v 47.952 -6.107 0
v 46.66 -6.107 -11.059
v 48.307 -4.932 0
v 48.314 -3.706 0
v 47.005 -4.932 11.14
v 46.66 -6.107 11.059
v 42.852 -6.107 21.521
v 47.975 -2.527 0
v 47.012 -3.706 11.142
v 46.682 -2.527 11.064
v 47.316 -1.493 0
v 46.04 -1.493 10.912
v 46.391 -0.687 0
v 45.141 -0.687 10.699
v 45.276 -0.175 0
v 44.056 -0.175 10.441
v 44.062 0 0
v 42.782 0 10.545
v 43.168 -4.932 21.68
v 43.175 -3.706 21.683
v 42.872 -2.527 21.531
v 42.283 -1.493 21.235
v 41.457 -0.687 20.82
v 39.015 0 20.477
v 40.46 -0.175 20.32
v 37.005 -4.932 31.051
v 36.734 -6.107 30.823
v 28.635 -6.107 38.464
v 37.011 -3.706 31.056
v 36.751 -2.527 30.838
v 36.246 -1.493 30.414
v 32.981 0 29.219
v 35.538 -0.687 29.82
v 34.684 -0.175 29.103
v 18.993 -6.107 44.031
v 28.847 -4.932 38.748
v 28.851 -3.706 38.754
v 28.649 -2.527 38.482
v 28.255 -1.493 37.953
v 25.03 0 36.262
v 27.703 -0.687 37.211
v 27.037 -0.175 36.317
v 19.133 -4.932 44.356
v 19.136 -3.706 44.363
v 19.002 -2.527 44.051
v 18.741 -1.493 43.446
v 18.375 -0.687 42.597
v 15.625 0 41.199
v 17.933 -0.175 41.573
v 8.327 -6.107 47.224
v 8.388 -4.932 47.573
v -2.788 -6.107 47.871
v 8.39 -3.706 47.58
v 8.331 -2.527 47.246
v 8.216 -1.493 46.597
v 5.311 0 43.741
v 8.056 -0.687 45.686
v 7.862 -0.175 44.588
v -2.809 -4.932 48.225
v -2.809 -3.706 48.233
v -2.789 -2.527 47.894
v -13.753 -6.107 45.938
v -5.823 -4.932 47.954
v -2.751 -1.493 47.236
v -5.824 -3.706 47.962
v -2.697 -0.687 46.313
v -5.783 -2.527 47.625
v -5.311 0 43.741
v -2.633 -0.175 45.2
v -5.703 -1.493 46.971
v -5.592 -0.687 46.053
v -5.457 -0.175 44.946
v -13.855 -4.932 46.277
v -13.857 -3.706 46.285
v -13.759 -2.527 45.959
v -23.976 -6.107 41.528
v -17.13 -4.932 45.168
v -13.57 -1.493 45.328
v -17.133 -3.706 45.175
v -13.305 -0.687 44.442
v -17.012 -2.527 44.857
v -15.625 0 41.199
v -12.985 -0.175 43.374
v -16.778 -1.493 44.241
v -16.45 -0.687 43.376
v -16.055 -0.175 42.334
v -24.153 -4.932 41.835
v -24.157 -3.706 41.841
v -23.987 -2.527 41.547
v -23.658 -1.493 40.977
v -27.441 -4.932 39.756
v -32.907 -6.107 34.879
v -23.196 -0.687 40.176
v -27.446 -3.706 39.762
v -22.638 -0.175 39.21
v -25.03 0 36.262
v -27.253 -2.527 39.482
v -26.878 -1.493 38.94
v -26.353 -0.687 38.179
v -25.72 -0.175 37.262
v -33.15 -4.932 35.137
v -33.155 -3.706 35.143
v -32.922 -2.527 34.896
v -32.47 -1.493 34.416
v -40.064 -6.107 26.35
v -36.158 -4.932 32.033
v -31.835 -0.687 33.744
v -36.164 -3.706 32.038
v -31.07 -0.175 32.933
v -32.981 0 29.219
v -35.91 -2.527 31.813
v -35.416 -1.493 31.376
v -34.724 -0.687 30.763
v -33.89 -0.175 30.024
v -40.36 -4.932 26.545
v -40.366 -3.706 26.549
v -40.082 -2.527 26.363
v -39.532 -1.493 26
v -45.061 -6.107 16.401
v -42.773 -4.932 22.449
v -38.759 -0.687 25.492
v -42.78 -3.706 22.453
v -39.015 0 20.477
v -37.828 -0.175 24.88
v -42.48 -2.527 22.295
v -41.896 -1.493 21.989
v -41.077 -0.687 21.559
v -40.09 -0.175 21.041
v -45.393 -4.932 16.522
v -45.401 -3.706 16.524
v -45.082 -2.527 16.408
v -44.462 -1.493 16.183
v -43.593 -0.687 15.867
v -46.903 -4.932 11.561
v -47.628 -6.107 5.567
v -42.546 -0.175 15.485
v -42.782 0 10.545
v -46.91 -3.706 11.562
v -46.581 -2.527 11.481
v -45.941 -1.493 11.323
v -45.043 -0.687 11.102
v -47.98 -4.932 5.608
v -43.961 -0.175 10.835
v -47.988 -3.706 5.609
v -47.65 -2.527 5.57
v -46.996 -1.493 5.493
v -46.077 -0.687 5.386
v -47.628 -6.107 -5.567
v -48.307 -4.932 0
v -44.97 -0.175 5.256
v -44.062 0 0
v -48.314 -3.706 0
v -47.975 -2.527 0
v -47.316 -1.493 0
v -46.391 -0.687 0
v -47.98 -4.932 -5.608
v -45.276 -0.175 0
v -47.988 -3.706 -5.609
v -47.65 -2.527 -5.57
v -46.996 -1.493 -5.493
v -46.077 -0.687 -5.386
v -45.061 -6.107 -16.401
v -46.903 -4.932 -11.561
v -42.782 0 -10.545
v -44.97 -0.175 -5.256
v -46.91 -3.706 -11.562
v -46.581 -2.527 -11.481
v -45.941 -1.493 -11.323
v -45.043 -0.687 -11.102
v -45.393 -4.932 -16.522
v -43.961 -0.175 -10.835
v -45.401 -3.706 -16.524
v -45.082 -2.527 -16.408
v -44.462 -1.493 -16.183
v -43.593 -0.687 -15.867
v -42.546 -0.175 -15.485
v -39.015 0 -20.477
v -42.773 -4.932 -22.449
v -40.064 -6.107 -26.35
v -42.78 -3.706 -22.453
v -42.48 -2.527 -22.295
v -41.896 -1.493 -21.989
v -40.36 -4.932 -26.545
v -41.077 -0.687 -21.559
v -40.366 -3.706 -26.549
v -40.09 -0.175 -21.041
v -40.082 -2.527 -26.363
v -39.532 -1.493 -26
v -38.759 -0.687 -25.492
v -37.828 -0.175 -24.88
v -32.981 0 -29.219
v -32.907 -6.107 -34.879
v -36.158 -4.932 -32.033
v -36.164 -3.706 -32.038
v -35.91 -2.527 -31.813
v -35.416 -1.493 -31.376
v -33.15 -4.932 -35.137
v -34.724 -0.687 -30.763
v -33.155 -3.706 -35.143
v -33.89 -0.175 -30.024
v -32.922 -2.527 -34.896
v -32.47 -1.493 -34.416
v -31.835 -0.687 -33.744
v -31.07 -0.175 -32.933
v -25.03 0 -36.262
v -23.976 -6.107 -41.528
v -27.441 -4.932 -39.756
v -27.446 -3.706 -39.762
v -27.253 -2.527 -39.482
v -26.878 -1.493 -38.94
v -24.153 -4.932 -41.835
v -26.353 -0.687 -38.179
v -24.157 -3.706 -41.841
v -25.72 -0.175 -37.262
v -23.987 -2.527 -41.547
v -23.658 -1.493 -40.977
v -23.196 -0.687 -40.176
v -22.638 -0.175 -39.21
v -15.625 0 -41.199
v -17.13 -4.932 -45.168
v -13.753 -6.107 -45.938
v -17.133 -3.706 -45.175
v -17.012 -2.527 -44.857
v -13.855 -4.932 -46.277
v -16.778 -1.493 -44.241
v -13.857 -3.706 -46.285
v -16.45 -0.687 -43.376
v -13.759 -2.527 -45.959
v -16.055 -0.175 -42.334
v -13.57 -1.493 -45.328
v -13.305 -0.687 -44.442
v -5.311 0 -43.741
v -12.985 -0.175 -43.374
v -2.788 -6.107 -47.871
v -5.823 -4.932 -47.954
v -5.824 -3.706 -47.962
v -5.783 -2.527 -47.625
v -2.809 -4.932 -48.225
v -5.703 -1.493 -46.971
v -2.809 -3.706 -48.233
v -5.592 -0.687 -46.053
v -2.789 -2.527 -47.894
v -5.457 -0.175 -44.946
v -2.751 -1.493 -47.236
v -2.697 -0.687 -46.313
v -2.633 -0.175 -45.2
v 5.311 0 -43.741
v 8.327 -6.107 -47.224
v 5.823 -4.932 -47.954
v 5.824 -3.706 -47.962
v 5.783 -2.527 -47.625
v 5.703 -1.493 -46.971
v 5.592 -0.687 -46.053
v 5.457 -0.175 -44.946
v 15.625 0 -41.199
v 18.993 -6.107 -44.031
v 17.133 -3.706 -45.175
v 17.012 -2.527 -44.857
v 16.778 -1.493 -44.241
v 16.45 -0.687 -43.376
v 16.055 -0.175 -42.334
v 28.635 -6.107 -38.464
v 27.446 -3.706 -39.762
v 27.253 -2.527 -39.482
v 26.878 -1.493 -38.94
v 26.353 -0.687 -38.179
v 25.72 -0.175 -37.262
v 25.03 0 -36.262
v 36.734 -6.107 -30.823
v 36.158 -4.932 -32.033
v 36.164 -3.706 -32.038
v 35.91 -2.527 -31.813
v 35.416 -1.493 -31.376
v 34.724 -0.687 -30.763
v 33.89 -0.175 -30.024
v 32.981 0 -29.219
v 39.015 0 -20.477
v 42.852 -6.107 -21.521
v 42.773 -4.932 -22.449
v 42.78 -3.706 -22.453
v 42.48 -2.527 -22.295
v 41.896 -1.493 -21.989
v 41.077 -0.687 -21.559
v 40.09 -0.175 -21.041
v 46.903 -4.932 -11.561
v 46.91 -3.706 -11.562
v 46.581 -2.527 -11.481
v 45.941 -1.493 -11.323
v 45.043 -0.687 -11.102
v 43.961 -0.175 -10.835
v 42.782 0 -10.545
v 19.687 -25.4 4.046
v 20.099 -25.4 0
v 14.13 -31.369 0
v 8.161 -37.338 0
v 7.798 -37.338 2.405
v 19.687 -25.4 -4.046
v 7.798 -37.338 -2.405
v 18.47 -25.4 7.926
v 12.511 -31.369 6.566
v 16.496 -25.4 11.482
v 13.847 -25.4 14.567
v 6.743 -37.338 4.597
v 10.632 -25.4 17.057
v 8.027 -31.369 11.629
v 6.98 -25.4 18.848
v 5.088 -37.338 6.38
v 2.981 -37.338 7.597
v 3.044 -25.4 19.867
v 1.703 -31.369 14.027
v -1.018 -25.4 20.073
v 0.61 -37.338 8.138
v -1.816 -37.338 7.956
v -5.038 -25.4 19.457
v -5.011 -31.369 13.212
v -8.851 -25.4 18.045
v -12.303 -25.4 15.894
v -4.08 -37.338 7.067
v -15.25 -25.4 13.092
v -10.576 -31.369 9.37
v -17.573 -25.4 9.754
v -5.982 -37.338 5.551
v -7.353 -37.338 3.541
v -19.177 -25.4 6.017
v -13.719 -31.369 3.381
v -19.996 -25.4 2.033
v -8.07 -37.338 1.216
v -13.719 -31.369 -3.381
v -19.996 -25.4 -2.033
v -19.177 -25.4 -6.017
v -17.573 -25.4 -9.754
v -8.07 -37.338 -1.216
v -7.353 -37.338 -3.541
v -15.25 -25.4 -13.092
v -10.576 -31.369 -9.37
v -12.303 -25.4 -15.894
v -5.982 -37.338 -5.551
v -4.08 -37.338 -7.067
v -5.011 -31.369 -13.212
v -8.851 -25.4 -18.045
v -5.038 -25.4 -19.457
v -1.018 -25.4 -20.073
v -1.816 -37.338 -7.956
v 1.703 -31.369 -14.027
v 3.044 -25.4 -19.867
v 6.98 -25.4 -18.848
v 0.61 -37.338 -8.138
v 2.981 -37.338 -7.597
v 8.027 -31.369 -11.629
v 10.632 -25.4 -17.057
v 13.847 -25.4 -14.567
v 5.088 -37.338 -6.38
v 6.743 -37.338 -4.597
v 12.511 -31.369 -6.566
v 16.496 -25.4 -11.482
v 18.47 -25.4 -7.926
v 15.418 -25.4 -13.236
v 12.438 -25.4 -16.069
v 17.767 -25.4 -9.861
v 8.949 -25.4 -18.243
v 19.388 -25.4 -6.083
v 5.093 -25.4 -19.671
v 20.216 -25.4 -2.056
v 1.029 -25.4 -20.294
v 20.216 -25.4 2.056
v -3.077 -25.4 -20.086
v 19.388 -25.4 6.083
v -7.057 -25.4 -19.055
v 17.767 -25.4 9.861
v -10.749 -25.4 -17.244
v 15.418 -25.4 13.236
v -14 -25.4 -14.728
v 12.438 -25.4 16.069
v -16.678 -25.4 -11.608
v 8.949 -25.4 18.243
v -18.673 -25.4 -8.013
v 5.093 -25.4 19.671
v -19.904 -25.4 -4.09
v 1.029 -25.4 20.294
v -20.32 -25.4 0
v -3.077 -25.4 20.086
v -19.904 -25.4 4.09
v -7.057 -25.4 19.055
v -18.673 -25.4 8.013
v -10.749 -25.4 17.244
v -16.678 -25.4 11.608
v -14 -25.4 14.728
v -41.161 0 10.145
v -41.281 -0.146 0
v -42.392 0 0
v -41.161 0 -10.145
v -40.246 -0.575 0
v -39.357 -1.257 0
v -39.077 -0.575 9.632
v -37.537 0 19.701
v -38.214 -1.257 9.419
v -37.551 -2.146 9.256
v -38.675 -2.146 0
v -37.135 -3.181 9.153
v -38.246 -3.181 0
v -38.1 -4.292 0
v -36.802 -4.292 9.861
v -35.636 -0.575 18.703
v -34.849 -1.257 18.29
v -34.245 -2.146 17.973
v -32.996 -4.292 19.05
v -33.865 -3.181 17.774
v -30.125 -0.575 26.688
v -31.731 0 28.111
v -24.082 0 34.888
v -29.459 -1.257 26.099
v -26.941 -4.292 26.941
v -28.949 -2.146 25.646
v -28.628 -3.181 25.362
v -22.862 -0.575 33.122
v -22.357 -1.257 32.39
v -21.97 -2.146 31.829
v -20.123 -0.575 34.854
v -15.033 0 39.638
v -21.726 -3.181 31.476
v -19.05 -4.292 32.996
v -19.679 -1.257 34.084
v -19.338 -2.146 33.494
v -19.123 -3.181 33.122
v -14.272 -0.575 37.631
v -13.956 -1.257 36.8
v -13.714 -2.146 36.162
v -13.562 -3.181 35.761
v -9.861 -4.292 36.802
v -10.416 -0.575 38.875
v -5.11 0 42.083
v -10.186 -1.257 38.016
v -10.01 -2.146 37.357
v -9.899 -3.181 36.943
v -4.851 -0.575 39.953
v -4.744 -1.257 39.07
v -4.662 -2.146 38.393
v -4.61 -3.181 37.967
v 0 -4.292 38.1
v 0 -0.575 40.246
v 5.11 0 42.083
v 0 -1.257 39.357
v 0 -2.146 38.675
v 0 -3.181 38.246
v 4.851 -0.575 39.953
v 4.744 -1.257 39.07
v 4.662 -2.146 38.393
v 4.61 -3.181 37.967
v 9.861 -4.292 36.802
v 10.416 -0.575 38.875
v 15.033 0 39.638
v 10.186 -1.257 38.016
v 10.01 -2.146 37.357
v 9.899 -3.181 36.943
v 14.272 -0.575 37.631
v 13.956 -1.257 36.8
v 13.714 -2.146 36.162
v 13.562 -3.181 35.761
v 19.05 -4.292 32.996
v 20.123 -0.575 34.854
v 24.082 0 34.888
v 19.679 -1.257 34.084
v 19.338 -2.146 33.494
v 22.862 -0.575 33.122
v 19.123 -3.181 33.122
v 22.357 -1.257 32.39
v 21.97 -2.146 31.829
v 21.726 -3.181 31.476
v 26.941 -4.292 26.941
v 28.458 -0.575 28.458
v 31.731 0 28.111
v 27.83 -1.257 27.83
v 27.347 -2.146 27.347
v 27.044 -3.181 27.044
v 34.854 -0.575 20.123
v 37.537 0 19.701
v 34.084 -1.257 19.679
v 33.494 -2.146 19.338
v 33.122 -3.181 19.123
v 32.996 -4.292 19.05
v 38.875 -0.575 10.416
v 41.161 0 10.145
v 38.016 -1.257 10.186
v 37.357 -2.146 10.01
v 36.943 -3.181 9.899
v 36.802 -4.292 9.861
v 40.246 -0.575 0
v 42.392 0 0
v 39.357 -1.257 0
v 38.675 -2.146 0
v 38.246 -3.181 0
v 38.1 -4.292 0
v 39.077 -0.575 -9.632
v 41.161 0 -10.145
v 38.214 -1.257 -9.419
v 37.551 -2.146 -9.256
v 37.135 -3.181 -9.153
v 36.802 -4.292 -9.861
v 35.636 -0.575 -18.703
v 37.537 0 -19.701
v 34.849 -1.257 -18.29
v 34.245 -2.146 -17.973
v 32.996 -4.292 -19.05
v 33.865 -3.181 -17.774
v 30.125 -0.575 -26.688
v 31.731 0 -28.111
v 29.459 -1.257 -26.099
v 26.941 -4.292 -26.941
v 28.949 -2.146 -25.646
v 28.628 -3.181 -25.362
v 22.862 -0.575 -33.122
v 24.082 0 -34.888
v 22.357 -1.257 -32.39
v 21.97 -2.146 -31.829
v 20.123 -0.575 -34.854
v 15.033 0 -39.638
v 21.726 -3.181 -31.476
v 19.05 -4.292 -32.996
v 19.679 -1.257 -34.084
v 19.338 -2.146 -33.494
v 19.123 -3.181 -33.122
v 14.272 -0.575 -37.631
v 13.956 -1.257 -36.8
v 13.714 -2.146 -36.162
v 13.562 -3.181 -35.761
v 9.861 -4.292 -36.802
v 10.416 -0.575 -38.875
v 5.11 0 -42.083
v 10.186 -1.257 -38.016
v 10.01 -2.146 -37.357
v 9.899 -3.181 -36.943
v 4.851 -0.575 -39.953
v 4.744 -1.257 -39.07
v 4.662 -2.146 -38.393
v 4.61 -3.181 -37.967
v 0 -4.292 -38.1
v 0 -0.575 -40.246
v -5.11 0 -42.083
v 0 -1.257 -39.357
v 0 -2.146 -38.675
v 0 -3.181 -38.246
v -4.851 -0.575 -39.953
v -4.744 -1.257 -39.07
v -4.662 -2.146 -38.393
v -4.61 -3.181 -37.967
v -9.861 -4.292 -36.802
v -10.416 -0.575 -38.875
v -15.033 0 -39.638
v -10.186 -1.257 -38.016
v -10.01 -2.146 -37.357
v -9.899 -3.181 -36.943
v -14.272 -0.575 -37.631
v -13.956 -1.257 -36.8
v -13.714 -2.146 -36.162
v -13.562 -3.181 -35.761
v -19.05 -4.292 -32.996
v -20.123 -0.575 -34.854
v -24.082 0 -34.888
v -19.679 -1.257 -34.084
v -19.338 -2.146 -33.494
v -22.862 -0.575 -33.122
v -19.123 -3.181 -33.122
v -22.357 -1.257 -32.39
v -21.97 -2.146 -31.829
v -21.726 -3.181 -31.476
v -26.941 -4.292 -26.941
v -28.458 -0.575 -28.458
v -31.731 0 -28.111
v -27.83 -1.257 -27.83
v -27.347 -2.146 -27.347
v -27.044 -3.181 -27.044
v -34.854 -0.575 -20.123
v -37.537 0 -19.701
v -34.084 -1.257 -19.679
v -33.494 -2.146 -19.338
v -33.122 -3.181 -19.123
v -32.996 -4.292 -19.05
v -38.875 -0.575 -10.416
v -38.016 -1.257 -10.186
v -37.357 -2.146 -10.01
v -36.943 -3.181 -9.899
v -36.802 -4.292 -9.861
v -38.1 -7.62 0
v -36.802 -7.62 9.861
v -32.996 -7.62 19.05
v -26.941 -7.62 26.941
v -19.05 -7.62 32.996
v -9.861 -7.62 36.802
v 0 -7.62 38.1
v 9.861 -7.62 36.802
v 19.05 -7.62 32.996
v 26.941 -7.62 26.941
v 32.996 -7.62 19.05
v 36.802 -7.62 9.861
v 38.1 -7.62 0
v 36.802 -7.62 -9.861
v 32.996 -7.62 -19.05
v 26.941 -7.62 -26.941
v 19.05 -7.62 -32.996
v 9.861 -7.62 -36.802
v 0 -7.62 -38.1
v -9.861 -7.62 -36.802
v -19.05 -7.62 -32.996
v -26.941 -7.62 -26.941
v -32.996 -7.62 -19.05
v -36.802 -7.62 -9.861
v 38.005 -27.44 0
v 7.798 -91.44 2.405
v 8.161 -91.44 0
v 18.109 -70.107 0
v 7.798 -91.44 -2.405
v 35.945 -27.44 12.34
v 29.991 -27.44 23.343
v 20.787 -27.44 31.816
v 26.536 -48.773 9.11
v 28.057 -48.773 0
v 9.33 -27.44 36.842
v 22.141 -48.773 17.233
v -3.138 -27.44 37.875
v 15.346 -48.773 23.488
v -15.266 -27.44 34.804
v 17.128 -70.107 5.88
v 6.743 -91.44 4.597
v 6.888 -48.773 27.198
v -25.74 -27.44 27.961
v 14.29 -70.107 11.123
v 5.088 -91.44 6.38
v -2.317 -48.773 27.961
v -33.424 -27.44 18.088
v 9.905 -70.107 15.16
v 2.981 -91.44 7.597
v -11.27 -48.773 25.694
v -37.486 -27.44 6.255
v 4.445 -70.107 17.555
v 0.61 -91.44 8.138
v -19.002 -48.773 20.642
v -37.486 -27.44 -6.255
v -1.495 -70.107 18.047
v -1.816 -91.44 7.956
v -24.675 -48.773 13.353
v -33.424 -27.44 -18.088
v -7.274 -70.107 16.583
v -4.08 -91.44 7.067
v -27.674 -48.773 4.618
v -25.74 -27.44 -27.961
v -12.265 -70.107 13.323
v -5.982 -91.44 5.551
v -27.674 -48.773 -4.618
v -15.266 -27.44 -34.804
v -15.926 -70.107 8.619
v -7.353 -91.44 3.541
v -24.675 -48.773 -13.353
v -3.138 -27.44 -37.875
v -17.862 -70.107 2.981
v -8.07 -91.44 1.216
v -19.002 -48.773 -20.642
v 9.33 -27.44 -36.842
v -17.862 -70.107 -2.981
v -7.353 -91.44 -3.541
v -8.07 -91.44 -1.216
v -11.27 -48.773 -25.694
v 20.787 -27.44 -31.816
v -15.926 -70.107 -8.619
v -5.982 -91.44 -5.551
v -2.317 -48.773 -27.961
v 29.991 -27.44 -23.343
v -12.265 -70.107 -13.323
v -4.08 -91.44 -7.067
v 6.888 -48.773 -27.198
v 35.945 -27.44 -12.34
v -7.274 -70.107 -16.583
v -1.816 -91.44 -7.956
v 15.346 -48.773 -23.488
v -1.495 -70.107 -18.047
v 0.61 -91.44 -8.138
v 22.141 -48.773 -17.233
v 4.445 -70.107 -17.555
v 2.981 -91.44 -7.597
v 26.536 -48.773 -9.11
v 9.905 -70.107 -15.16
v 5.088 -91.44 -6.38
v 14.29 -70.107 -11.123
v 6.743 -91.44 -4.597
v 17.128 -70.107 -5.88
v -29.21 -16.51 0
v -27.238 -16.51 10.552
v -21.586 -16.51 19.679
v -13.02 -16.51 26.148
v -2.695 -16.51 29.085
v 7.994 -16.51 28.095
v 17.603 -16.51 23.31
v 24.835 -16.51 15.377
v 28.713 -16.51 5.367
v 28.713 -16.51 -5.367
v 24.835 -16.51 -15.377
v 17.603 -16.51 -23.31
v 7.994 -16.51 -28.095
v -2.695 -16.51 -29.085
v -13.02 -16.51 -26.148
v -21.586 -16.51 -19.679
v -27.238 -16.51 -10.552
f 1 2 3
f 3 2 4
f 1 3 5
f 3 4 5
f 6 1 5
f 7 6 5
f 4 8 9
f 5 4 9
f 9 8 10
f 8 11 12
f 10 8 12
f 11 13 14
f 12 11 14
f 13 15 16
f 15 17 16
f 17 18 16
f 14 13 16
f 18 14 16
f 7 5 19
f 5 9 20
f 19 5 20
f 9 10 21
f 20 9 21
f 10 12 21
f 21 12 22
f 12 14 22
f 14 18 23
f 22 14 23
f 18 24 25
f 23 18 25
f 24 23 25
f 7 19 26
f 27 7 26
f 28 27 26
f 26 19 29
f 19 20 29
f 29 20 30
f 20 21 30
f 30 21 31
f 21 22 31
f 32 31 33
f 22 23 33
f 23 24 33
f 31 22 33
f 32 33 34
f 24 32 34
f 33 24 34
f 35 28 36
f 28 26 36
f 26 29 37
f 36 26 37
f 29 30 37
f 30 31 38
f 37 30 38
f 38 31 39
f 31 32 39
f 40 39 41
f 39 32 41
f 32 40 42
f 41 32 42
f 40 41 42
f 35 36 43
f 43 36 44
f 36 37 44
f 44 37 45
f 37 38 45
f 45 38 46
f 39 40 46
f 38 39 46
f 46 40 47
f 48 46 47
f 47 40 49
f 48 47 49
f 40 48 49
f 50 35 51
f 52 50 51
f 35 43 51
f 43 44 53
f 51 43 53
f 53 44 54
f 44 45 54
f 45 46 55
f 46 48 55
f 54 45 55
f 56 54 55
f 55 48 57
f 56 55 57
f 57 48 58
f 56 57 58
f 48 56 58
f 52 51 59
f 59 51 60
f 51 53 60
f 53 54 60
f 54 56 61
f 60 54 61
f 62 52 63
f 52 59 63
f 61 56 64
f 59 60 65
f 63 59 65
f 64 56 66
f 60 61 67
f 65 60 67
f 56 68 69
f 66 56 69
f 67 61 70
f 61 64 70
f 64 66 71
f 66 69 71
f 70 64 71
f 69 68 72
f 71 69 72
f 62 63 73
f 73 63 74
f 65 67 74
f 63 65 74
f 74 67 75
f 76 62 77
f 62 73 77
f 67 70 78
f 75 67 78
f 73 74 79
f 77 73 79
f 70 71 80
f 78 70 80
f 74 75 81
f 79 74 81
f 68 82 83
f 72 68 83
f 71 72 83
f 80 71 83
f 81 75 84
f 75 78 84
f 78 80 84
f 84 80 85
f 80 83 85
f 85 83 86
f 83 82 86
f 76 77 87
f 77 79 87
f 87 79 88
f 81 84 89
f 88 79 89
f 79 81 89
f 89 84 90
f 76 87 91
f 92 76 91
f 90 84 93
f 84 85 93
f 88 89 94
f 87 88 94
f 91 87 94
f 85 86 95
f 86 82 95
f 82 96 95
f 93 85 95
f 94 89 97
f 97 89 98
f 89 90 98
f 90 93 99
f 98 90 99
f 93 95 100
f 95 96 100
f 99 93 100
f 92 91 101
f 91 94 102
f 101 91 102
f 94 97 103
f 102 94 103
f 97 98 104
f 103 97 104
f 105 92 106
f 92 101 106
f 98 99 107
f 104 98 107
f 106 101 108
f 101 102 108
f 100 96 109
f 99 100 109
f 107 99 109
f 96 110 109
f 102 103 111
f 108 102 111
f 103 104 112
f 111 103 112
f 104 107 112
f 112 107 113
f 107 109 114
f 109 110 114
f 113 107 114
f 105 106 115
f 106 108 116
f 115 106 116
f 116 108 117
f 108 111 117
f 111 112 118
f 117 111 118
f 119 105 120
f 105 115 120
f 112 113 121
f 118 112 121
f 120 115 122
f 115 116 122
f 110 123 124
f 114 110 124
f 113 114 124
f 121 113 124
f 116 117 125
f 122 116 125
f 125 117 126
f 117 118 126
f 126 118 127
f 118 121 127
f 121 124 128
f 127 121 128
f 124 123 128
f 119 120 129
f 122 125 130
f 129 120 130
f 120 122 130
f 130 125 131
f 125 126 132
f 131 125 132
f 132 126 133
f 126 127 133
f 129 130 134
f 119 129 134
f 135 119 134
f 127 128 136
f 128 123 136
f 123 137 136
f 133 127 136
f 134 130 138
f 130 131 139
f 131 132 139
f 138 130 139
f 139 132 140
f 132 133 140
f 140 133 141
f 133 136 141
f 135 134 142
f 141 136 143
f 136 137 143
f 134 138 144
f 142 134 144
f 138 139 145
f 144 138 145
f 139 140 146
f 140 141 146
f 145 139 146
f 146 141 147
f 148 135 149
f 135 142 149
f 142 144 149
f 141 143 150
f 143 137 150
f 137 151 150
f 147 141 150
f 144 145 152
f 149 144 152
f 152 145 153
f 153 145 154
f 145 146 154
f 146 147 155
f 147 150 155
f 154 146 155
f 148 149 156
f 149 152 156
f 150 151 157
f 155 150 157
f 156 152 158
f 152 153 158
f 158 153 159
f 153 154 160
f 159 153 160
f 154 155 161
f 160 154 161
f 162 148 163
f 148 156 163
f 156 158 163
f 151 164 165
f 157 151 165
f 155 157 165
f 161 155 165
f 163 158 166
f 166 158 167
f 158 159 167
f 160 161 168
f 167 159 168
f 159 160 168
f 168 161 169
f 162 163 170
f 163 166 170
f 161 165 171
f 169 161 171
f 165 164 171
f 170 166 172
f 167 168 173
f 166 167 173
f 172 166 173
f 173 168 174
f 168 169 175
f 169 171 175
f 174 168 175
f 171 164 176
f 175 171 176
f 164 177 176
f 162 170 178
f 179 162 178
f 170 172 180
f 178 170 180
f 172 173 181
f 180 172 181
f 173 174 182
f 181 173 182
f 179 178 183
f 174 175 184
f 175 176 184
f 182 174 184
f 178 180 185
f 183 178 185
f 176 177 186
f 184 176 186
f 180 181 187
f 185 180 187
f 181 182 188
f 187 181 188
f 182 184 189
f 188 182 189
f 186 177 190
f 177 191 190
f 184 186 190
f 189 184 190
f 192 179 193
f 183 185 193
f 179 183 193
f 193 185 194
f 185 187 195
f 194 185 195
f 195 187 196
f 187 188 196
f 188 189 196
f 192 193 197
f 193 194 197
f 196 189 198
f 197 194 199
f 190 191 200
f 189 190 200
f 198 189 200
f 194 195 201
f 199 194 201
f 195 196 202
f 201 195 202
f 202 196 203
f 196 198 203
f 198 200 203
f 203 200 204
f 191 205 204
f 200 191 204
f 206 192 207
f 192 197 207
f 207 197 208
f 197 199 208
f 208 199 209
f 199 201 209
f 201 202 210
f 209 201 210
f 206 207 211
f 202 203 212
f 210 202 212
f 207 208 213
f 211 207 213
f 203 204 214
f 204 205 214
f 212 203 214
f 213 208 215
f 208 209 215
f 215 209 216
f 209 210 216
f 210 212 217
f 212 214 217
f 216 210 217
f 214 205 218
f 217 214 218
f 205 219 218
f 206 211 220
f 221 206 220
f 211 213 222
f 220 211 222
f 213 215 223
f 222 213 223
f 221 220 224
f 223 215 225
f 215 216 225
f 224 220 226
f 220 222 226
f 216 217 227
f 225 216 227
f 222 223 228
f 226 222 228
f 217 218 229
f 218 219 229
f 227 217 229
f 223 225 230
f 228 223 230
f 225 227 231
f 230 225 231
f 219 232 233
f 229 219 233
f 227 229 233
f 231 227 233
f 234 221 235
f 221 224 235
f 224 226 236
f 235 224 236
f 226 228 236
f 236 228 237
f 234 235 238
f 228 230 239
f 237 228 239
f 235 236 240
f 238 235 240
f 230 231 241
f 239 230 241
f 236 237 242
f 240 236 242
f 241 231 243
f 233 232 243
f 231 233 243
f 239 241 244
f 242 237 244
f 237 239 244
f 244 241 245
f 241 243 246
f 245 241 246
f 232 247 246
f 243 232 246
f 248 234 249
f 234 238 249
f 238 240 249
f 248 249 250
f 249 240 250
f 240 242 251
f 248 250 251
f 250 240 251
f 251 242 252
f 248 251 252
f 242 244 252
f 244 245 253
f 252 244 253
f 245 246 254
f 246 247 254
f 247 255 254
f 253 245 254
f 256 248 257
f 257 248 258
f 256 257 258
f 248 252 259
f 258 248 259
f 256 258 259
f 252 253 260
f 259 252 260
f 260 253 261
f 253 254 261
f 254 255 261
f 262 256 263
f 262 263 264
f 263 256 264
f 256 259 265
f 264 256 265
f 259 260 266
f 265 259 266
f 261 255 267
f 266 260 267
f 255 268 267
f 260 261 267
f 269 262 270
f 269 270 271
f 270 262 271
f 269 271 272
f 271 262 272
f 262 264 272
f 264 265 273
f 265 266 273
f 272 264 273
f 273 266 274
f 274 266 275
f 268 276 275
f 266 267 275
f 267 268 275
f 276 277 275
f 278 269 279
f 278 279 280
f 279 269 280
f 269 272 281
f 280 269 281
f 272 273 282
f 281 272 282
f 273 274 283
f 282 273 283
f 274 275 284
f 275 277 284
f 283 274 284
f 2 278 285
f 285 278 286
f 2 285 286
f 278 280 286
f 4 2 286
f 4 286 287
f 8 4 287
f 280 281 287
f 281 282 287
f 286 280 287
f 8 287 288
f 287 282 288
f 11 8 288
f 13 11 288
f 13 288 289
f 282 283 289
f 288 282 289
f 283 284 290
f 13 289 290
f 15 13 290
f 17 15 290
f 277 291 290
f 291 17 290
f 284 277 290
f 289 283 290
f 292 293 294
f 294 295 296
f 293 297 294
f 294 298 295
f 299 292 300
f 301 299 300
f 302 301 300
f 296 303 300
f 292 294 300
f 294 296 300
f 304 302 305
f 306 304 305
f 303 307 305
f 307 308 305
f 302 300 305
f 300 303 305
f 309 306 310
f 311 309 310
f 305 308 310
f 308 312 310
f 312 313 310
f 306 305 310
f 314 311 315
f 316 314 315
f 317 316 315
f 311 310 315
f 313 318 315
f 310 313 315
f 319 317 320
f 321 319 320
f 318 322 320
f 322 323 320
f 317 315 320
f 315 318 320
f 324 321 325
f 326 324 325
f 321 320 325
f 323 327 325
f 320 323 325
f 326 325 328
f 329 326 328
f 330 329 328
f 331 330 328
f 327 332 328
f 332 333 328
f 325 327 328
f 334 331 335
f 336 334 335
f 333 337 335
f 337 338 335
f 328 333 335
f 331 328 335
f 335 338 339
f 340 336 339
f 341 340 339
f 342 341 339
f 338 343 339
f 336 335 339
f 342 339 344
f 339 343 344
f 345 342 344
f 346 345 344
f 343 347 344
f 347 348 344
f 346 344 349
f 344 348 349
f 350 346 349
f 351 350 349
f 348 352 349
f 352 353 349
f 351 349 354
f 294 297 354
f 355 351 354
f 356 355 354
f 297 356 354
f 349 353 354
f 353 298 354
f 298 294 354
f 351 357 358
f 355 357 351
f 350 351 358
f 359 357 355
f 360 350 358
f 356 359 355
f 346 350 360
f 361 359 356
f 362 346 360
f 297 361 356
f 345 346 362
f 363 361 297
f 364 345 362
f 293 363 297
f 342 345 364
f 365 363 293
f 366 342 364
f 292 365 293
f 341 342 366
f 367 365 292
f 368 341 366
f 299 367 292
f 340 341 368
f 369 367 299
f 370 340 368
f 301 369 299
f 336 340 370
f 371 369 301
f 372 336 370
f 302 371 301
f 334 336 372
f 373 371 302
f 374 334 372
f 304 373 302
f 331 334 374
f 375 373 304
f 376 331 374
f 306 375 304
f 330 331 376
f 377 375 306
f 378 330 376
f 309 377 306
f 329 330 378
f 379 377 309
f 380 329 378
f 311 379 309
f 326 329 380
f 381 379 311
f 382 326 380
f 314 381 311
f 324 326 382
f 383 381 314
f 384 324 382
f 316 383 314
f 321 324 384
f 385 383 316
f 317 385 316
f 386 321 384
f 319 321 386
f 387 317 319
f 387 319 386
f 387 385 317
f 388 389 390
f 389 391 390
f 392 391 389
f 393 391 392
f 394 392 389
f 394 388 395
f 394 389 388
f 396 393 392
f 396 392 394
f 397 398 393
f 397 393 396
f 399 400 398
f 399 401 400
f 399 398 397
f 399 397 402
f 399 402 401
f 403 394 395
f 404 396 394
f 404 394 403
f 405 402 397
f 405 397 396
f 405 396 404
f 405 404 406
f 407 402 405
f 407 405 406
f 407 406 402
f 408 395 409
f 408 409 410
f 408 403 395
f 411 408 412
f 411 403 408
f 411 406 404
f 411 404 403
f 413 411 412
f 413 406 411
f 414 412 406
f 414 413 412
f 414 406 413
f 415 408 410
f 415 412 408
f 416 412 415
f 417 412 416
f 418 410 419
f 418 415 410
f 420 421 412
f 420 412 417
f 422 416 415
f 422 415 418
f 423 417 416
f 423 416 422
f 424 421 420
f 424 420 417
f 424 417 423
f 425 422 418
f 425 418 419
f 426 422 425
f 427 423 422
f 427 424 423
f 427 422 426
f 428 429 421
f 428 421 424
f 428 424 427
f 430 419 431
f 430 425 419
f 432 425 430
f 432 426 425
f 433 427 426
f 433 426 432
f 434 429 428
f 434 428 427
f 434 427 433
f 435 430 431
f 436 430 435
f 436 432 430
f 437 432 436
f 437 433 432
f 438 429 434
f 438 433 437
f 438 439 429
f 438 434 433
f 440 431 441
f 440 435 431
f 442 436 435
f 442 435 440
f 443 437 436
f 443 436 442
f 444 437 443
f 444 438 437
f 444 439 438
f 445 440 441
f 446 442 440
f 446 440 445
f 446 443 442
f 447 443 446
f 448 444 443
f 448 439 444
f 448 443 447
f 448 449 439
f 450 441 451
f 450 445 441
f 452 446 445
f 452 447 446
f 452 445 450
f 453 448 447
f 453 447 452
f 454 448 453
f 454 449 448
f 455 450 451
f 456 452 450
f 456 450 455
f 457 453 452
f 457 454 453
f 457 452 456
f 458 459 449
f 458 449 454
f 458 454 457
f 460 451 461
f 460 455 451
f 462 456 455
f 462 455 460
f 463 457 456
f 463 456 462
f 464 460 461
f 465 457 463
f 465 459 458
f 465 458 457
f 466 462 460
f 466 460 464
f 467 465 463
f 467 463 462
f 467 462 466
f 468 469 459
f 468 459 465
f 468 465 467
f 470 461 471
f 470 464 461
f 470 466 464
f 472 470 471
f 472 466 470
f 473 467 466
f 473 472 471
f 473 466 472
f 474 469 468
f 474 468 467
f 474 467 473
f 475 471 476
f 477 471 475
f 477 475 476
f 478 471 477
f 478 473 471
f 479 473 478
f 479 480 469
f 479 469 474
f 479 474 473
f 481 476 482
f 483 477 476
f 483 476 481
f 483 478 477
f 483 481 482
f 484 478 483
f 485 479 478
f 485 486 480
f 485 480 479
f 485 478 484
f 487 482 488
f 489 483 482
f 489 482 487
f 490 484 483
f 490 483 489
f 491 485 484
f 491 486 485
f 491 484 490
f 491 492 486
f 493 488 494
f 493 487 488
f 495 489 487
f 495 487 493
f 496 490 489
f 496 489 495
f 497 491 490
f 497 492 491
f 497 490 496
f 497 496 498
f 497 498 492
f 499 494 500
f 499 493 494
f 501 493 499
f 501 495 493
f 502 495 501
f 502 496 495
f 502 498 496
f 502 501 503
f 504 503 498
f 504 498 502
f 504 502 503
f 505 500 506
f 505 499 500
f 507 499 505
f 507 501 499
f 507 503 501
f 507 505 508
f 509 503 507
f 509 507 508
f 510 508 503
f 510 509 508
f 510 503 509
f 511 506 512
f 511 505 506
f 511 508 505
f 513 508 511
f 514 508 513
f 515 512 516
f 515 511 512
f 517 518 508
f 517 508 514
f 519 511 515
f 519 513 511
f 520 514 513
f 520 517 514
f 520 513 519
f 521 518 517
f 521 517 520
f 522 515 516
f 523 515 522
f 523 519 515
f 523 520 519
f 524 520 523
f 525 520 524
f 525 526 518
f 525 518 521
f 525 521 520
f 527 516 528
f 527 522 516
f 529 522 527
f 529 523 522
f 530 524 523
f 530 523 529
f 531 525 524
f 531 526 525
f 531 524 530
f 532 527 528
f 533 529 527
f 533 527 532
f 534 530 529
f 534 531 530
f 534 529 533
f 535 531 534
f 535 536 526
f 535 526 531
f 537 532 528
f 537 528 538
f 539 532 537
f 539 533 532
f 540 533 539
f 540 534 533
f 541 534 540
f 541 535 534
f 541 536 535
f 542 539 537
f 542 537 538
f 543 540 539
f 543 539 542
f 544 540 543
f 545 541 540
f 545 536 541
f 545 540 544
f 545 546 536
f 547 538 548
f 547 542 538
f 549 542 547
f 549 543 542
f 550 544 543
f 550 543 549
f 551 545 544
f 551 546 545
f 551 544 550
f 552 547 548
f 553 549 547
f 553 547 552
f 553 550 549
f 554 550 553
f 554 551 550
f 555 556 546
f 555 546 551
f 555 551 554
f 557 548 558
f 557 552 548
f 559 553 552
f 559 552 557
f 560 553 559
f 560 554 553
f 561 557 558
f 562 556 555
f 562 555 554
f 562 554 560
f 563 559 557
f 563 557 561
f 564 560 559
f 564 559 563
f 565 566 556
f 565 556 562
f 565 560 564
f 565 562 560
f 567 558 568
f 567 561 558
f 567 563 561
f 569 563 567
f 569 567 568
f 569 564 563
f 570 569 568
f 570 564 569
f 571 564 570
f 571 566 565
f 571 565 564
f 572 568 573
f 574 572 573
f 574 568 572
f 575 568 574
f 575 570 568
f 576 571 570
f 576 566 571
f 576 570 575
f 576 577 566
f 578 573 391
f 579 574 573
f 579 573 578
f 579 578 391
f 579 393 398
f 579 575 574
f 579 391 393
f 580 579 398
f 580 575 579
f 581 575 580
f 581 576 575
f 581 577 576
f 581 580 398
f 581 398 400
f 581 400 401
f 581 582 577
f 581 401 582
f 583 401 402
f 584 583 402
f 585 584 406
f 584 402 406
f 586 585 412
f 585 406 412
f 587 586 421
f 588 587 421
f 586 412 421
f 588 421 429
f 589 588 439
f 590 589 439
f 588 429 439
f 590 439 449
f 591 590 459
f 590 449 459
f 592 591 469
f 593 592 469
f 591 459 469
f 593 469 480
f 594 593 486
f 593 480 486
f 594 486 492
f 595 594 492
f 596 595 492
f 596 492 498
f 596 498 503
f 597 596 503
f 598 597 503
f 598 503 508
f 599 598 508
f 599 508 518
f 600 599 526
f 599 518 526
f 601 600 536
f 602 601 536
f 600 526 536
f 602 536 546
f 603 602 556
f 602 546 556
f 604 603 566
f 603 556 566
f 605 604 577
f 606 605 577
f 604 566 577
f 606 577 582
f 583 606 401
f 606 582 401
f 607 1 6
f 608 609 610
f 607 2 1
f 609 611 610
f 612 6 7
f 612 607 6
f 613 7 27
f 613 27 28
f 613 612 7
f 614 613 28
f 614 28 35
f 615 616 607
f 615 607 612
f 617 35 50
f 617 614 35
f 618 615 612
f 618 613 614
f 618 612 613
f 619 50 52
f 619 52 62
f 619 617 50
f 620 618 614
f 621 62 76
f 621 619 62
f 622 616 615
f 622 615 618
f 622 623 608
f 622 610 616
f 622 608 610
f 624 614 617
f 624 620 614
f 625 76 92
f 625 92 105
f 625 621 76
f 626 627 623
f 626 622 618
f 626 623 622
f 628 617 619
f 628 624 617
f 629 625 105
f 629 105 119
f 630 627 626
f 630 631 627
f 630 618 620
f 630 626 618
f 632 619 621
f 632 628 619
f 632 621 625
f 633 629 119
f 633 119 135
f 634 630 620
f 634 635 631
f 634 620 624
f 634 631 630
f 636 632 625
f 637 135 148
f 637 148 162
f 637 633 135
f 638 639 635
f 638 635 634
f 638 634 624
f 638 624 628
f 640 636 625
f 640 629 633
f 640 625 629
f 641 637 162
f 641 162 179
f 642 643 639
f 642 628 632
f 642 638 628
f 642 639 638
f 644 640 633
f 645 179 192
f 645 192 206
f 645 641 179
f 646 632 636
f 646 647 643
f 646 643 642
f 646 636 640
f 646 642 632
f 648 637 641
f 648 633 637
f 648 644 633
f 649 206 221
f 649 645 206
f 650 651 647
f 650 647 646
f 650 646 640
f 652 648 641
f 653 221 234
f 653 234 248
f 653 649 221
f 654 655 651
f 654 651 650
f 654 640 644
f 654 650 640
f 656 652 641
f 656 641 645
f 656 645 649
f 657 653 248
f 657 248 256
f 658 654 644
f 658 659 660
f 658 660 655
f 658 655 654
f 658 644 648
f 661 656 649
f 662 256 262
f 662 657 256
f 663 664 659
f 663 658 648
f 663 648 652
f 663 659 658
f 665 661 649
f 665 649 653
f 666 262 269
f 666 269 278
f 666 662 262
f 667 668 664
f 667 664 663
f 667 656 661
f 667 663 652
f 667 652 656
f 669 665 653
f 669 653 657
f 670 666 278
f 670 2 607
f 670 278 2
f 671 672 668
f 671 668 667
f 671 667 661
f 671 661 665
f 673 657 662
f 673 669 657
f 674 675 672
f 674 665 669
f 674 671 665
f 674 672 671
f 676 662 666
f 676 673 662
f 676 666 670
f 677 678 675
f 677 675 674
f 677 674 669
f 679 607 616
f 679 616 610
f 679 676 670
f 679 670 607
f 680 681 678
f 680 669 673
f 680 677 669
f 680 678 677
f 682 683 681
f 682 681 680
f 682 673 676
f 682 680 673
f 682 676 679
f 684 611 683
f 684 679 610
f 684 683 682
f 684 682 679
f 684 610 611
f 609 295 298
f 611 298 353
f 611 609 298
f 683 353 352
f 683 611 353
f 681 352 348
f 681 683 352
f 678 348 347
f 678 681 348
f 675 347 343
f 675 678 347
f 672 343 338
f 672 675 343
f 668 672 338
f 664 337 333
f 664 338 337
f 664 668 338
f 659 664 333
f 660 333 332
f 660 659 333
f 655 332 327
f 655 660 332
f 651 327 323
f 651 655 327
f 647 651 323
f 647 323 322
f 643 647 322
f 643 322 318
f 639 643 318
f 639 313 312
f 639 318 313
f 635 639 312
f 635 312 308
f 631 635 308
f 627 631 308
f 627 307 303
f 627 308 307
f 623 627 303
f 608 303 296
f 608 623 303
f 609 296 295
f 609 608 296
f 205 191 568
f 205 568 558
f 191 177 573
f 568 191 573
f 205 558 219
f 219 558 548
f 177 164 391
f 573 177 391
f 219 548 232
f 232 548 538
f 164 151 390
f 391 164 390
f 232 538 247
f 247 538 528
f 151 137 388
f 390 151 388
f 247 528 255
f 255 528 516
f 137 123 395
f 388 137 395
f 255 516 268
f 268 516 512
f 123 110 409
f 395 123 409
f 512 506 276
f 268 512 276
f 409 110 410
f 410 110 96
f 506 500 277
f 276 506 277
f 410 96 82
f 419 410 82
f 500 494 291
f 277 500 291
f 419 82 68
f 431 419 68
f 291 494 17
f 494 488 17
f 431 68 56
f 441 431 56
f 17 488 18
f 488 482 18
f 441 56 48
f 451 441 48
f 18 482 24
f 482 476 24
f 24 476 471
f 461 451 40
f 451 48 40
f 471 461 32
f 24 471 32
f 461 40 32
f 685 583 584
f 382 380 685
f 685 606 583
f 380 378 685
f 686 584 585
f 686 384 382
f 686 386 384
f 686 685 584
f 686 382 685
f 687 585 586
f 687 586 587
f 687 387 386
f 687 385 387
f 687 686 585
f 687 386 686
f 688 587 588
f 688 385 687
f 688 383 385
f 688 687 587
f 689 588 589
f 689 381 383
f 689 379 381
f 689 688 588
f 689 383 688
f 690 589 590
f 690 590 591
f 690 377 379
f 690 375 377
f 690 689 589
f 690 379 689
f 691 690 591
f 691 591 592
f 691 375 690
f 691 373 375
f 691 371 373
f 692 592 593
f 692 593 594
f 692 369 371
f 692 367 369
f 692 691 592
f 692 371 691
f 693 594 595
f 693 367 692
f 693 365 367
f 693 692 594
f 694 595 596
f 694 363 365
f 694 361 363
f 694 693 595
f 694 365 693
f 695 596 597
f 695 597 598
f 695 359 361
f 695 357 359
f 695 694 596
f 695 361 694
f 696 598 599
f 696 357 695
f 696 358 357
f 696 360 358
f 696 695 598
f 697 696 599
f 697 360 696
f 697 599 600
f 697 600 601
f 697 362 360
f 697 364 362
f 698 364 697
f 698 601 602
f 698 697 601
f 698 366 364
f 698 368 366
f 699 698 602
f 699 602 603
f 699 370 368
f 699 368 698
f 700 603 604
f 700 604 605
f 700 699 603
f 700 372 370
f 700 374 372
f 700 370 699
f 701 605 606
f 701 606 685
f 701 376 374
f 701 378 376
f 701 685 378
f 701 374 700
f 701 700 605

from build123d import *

# Parameters (mm, degrees)
F0_R     = 50.8
F1_DEPTH = 91.44
F1_TAPER = 25
F2_R     = 38.1
F3_DEPTH = 25.4
F4_R     = 4.2924717139
F5_SIZE  = 17.78
F6_DEPTH = 106.172
F7_SIZE  = 11.938


with BuildPart() as f1:
    # F0 (on Front) → F1 (new body)
    with BuildSketch(Plane.XZ):
        Circle(F0_R)
    extrude(amount=F1_DEPTH, taper=F1_TAPER)

    # F2 (on face) → F3 (cut)
    with BuildSketch(Plane(origin=(0, 0, 0), x_dir=(-1, 0, 0), z_dir=(0, 1, 0))):
        Circle(F2_R)
    extrude(amount=-F3_DEPTH, mode=Mode.SUBTRACT)

    # F4
    f4_edges = [f1.edges().sort_by_distance(p)[0] for p in [
        (-50.8, 0, 0),
        (38.1, 0, 0),
    ]]
    fillet(f4_edges, radius=F4_R)

    # F5
    f5_edges = [f1.edges().sort_by_distance(p)[0] for p in [
        (38.1, -4.292472, 0),
        (38.1, -25.4, 0),
    ]]
    chamfer(f5_edges, length=F5_SIZE)

    # F6 (cut): a face of the model
    f6_faces = [f1.faces().sort_by_distance(p)[0] for p in [
        (0, -91.44, 0),
    ]]
    extrude(f6_faces, amount=-F6_DEPTH, mode=Mode.SUBTRACT)

    # F7
    f7_edges = [f1.edges().sort_by_distance(p)[0] for p in [
        (-8.160828, -25.4, 0),
    ]]
    chamfer(f7_edges, length=F7_SIZE)


solid = f1.part
